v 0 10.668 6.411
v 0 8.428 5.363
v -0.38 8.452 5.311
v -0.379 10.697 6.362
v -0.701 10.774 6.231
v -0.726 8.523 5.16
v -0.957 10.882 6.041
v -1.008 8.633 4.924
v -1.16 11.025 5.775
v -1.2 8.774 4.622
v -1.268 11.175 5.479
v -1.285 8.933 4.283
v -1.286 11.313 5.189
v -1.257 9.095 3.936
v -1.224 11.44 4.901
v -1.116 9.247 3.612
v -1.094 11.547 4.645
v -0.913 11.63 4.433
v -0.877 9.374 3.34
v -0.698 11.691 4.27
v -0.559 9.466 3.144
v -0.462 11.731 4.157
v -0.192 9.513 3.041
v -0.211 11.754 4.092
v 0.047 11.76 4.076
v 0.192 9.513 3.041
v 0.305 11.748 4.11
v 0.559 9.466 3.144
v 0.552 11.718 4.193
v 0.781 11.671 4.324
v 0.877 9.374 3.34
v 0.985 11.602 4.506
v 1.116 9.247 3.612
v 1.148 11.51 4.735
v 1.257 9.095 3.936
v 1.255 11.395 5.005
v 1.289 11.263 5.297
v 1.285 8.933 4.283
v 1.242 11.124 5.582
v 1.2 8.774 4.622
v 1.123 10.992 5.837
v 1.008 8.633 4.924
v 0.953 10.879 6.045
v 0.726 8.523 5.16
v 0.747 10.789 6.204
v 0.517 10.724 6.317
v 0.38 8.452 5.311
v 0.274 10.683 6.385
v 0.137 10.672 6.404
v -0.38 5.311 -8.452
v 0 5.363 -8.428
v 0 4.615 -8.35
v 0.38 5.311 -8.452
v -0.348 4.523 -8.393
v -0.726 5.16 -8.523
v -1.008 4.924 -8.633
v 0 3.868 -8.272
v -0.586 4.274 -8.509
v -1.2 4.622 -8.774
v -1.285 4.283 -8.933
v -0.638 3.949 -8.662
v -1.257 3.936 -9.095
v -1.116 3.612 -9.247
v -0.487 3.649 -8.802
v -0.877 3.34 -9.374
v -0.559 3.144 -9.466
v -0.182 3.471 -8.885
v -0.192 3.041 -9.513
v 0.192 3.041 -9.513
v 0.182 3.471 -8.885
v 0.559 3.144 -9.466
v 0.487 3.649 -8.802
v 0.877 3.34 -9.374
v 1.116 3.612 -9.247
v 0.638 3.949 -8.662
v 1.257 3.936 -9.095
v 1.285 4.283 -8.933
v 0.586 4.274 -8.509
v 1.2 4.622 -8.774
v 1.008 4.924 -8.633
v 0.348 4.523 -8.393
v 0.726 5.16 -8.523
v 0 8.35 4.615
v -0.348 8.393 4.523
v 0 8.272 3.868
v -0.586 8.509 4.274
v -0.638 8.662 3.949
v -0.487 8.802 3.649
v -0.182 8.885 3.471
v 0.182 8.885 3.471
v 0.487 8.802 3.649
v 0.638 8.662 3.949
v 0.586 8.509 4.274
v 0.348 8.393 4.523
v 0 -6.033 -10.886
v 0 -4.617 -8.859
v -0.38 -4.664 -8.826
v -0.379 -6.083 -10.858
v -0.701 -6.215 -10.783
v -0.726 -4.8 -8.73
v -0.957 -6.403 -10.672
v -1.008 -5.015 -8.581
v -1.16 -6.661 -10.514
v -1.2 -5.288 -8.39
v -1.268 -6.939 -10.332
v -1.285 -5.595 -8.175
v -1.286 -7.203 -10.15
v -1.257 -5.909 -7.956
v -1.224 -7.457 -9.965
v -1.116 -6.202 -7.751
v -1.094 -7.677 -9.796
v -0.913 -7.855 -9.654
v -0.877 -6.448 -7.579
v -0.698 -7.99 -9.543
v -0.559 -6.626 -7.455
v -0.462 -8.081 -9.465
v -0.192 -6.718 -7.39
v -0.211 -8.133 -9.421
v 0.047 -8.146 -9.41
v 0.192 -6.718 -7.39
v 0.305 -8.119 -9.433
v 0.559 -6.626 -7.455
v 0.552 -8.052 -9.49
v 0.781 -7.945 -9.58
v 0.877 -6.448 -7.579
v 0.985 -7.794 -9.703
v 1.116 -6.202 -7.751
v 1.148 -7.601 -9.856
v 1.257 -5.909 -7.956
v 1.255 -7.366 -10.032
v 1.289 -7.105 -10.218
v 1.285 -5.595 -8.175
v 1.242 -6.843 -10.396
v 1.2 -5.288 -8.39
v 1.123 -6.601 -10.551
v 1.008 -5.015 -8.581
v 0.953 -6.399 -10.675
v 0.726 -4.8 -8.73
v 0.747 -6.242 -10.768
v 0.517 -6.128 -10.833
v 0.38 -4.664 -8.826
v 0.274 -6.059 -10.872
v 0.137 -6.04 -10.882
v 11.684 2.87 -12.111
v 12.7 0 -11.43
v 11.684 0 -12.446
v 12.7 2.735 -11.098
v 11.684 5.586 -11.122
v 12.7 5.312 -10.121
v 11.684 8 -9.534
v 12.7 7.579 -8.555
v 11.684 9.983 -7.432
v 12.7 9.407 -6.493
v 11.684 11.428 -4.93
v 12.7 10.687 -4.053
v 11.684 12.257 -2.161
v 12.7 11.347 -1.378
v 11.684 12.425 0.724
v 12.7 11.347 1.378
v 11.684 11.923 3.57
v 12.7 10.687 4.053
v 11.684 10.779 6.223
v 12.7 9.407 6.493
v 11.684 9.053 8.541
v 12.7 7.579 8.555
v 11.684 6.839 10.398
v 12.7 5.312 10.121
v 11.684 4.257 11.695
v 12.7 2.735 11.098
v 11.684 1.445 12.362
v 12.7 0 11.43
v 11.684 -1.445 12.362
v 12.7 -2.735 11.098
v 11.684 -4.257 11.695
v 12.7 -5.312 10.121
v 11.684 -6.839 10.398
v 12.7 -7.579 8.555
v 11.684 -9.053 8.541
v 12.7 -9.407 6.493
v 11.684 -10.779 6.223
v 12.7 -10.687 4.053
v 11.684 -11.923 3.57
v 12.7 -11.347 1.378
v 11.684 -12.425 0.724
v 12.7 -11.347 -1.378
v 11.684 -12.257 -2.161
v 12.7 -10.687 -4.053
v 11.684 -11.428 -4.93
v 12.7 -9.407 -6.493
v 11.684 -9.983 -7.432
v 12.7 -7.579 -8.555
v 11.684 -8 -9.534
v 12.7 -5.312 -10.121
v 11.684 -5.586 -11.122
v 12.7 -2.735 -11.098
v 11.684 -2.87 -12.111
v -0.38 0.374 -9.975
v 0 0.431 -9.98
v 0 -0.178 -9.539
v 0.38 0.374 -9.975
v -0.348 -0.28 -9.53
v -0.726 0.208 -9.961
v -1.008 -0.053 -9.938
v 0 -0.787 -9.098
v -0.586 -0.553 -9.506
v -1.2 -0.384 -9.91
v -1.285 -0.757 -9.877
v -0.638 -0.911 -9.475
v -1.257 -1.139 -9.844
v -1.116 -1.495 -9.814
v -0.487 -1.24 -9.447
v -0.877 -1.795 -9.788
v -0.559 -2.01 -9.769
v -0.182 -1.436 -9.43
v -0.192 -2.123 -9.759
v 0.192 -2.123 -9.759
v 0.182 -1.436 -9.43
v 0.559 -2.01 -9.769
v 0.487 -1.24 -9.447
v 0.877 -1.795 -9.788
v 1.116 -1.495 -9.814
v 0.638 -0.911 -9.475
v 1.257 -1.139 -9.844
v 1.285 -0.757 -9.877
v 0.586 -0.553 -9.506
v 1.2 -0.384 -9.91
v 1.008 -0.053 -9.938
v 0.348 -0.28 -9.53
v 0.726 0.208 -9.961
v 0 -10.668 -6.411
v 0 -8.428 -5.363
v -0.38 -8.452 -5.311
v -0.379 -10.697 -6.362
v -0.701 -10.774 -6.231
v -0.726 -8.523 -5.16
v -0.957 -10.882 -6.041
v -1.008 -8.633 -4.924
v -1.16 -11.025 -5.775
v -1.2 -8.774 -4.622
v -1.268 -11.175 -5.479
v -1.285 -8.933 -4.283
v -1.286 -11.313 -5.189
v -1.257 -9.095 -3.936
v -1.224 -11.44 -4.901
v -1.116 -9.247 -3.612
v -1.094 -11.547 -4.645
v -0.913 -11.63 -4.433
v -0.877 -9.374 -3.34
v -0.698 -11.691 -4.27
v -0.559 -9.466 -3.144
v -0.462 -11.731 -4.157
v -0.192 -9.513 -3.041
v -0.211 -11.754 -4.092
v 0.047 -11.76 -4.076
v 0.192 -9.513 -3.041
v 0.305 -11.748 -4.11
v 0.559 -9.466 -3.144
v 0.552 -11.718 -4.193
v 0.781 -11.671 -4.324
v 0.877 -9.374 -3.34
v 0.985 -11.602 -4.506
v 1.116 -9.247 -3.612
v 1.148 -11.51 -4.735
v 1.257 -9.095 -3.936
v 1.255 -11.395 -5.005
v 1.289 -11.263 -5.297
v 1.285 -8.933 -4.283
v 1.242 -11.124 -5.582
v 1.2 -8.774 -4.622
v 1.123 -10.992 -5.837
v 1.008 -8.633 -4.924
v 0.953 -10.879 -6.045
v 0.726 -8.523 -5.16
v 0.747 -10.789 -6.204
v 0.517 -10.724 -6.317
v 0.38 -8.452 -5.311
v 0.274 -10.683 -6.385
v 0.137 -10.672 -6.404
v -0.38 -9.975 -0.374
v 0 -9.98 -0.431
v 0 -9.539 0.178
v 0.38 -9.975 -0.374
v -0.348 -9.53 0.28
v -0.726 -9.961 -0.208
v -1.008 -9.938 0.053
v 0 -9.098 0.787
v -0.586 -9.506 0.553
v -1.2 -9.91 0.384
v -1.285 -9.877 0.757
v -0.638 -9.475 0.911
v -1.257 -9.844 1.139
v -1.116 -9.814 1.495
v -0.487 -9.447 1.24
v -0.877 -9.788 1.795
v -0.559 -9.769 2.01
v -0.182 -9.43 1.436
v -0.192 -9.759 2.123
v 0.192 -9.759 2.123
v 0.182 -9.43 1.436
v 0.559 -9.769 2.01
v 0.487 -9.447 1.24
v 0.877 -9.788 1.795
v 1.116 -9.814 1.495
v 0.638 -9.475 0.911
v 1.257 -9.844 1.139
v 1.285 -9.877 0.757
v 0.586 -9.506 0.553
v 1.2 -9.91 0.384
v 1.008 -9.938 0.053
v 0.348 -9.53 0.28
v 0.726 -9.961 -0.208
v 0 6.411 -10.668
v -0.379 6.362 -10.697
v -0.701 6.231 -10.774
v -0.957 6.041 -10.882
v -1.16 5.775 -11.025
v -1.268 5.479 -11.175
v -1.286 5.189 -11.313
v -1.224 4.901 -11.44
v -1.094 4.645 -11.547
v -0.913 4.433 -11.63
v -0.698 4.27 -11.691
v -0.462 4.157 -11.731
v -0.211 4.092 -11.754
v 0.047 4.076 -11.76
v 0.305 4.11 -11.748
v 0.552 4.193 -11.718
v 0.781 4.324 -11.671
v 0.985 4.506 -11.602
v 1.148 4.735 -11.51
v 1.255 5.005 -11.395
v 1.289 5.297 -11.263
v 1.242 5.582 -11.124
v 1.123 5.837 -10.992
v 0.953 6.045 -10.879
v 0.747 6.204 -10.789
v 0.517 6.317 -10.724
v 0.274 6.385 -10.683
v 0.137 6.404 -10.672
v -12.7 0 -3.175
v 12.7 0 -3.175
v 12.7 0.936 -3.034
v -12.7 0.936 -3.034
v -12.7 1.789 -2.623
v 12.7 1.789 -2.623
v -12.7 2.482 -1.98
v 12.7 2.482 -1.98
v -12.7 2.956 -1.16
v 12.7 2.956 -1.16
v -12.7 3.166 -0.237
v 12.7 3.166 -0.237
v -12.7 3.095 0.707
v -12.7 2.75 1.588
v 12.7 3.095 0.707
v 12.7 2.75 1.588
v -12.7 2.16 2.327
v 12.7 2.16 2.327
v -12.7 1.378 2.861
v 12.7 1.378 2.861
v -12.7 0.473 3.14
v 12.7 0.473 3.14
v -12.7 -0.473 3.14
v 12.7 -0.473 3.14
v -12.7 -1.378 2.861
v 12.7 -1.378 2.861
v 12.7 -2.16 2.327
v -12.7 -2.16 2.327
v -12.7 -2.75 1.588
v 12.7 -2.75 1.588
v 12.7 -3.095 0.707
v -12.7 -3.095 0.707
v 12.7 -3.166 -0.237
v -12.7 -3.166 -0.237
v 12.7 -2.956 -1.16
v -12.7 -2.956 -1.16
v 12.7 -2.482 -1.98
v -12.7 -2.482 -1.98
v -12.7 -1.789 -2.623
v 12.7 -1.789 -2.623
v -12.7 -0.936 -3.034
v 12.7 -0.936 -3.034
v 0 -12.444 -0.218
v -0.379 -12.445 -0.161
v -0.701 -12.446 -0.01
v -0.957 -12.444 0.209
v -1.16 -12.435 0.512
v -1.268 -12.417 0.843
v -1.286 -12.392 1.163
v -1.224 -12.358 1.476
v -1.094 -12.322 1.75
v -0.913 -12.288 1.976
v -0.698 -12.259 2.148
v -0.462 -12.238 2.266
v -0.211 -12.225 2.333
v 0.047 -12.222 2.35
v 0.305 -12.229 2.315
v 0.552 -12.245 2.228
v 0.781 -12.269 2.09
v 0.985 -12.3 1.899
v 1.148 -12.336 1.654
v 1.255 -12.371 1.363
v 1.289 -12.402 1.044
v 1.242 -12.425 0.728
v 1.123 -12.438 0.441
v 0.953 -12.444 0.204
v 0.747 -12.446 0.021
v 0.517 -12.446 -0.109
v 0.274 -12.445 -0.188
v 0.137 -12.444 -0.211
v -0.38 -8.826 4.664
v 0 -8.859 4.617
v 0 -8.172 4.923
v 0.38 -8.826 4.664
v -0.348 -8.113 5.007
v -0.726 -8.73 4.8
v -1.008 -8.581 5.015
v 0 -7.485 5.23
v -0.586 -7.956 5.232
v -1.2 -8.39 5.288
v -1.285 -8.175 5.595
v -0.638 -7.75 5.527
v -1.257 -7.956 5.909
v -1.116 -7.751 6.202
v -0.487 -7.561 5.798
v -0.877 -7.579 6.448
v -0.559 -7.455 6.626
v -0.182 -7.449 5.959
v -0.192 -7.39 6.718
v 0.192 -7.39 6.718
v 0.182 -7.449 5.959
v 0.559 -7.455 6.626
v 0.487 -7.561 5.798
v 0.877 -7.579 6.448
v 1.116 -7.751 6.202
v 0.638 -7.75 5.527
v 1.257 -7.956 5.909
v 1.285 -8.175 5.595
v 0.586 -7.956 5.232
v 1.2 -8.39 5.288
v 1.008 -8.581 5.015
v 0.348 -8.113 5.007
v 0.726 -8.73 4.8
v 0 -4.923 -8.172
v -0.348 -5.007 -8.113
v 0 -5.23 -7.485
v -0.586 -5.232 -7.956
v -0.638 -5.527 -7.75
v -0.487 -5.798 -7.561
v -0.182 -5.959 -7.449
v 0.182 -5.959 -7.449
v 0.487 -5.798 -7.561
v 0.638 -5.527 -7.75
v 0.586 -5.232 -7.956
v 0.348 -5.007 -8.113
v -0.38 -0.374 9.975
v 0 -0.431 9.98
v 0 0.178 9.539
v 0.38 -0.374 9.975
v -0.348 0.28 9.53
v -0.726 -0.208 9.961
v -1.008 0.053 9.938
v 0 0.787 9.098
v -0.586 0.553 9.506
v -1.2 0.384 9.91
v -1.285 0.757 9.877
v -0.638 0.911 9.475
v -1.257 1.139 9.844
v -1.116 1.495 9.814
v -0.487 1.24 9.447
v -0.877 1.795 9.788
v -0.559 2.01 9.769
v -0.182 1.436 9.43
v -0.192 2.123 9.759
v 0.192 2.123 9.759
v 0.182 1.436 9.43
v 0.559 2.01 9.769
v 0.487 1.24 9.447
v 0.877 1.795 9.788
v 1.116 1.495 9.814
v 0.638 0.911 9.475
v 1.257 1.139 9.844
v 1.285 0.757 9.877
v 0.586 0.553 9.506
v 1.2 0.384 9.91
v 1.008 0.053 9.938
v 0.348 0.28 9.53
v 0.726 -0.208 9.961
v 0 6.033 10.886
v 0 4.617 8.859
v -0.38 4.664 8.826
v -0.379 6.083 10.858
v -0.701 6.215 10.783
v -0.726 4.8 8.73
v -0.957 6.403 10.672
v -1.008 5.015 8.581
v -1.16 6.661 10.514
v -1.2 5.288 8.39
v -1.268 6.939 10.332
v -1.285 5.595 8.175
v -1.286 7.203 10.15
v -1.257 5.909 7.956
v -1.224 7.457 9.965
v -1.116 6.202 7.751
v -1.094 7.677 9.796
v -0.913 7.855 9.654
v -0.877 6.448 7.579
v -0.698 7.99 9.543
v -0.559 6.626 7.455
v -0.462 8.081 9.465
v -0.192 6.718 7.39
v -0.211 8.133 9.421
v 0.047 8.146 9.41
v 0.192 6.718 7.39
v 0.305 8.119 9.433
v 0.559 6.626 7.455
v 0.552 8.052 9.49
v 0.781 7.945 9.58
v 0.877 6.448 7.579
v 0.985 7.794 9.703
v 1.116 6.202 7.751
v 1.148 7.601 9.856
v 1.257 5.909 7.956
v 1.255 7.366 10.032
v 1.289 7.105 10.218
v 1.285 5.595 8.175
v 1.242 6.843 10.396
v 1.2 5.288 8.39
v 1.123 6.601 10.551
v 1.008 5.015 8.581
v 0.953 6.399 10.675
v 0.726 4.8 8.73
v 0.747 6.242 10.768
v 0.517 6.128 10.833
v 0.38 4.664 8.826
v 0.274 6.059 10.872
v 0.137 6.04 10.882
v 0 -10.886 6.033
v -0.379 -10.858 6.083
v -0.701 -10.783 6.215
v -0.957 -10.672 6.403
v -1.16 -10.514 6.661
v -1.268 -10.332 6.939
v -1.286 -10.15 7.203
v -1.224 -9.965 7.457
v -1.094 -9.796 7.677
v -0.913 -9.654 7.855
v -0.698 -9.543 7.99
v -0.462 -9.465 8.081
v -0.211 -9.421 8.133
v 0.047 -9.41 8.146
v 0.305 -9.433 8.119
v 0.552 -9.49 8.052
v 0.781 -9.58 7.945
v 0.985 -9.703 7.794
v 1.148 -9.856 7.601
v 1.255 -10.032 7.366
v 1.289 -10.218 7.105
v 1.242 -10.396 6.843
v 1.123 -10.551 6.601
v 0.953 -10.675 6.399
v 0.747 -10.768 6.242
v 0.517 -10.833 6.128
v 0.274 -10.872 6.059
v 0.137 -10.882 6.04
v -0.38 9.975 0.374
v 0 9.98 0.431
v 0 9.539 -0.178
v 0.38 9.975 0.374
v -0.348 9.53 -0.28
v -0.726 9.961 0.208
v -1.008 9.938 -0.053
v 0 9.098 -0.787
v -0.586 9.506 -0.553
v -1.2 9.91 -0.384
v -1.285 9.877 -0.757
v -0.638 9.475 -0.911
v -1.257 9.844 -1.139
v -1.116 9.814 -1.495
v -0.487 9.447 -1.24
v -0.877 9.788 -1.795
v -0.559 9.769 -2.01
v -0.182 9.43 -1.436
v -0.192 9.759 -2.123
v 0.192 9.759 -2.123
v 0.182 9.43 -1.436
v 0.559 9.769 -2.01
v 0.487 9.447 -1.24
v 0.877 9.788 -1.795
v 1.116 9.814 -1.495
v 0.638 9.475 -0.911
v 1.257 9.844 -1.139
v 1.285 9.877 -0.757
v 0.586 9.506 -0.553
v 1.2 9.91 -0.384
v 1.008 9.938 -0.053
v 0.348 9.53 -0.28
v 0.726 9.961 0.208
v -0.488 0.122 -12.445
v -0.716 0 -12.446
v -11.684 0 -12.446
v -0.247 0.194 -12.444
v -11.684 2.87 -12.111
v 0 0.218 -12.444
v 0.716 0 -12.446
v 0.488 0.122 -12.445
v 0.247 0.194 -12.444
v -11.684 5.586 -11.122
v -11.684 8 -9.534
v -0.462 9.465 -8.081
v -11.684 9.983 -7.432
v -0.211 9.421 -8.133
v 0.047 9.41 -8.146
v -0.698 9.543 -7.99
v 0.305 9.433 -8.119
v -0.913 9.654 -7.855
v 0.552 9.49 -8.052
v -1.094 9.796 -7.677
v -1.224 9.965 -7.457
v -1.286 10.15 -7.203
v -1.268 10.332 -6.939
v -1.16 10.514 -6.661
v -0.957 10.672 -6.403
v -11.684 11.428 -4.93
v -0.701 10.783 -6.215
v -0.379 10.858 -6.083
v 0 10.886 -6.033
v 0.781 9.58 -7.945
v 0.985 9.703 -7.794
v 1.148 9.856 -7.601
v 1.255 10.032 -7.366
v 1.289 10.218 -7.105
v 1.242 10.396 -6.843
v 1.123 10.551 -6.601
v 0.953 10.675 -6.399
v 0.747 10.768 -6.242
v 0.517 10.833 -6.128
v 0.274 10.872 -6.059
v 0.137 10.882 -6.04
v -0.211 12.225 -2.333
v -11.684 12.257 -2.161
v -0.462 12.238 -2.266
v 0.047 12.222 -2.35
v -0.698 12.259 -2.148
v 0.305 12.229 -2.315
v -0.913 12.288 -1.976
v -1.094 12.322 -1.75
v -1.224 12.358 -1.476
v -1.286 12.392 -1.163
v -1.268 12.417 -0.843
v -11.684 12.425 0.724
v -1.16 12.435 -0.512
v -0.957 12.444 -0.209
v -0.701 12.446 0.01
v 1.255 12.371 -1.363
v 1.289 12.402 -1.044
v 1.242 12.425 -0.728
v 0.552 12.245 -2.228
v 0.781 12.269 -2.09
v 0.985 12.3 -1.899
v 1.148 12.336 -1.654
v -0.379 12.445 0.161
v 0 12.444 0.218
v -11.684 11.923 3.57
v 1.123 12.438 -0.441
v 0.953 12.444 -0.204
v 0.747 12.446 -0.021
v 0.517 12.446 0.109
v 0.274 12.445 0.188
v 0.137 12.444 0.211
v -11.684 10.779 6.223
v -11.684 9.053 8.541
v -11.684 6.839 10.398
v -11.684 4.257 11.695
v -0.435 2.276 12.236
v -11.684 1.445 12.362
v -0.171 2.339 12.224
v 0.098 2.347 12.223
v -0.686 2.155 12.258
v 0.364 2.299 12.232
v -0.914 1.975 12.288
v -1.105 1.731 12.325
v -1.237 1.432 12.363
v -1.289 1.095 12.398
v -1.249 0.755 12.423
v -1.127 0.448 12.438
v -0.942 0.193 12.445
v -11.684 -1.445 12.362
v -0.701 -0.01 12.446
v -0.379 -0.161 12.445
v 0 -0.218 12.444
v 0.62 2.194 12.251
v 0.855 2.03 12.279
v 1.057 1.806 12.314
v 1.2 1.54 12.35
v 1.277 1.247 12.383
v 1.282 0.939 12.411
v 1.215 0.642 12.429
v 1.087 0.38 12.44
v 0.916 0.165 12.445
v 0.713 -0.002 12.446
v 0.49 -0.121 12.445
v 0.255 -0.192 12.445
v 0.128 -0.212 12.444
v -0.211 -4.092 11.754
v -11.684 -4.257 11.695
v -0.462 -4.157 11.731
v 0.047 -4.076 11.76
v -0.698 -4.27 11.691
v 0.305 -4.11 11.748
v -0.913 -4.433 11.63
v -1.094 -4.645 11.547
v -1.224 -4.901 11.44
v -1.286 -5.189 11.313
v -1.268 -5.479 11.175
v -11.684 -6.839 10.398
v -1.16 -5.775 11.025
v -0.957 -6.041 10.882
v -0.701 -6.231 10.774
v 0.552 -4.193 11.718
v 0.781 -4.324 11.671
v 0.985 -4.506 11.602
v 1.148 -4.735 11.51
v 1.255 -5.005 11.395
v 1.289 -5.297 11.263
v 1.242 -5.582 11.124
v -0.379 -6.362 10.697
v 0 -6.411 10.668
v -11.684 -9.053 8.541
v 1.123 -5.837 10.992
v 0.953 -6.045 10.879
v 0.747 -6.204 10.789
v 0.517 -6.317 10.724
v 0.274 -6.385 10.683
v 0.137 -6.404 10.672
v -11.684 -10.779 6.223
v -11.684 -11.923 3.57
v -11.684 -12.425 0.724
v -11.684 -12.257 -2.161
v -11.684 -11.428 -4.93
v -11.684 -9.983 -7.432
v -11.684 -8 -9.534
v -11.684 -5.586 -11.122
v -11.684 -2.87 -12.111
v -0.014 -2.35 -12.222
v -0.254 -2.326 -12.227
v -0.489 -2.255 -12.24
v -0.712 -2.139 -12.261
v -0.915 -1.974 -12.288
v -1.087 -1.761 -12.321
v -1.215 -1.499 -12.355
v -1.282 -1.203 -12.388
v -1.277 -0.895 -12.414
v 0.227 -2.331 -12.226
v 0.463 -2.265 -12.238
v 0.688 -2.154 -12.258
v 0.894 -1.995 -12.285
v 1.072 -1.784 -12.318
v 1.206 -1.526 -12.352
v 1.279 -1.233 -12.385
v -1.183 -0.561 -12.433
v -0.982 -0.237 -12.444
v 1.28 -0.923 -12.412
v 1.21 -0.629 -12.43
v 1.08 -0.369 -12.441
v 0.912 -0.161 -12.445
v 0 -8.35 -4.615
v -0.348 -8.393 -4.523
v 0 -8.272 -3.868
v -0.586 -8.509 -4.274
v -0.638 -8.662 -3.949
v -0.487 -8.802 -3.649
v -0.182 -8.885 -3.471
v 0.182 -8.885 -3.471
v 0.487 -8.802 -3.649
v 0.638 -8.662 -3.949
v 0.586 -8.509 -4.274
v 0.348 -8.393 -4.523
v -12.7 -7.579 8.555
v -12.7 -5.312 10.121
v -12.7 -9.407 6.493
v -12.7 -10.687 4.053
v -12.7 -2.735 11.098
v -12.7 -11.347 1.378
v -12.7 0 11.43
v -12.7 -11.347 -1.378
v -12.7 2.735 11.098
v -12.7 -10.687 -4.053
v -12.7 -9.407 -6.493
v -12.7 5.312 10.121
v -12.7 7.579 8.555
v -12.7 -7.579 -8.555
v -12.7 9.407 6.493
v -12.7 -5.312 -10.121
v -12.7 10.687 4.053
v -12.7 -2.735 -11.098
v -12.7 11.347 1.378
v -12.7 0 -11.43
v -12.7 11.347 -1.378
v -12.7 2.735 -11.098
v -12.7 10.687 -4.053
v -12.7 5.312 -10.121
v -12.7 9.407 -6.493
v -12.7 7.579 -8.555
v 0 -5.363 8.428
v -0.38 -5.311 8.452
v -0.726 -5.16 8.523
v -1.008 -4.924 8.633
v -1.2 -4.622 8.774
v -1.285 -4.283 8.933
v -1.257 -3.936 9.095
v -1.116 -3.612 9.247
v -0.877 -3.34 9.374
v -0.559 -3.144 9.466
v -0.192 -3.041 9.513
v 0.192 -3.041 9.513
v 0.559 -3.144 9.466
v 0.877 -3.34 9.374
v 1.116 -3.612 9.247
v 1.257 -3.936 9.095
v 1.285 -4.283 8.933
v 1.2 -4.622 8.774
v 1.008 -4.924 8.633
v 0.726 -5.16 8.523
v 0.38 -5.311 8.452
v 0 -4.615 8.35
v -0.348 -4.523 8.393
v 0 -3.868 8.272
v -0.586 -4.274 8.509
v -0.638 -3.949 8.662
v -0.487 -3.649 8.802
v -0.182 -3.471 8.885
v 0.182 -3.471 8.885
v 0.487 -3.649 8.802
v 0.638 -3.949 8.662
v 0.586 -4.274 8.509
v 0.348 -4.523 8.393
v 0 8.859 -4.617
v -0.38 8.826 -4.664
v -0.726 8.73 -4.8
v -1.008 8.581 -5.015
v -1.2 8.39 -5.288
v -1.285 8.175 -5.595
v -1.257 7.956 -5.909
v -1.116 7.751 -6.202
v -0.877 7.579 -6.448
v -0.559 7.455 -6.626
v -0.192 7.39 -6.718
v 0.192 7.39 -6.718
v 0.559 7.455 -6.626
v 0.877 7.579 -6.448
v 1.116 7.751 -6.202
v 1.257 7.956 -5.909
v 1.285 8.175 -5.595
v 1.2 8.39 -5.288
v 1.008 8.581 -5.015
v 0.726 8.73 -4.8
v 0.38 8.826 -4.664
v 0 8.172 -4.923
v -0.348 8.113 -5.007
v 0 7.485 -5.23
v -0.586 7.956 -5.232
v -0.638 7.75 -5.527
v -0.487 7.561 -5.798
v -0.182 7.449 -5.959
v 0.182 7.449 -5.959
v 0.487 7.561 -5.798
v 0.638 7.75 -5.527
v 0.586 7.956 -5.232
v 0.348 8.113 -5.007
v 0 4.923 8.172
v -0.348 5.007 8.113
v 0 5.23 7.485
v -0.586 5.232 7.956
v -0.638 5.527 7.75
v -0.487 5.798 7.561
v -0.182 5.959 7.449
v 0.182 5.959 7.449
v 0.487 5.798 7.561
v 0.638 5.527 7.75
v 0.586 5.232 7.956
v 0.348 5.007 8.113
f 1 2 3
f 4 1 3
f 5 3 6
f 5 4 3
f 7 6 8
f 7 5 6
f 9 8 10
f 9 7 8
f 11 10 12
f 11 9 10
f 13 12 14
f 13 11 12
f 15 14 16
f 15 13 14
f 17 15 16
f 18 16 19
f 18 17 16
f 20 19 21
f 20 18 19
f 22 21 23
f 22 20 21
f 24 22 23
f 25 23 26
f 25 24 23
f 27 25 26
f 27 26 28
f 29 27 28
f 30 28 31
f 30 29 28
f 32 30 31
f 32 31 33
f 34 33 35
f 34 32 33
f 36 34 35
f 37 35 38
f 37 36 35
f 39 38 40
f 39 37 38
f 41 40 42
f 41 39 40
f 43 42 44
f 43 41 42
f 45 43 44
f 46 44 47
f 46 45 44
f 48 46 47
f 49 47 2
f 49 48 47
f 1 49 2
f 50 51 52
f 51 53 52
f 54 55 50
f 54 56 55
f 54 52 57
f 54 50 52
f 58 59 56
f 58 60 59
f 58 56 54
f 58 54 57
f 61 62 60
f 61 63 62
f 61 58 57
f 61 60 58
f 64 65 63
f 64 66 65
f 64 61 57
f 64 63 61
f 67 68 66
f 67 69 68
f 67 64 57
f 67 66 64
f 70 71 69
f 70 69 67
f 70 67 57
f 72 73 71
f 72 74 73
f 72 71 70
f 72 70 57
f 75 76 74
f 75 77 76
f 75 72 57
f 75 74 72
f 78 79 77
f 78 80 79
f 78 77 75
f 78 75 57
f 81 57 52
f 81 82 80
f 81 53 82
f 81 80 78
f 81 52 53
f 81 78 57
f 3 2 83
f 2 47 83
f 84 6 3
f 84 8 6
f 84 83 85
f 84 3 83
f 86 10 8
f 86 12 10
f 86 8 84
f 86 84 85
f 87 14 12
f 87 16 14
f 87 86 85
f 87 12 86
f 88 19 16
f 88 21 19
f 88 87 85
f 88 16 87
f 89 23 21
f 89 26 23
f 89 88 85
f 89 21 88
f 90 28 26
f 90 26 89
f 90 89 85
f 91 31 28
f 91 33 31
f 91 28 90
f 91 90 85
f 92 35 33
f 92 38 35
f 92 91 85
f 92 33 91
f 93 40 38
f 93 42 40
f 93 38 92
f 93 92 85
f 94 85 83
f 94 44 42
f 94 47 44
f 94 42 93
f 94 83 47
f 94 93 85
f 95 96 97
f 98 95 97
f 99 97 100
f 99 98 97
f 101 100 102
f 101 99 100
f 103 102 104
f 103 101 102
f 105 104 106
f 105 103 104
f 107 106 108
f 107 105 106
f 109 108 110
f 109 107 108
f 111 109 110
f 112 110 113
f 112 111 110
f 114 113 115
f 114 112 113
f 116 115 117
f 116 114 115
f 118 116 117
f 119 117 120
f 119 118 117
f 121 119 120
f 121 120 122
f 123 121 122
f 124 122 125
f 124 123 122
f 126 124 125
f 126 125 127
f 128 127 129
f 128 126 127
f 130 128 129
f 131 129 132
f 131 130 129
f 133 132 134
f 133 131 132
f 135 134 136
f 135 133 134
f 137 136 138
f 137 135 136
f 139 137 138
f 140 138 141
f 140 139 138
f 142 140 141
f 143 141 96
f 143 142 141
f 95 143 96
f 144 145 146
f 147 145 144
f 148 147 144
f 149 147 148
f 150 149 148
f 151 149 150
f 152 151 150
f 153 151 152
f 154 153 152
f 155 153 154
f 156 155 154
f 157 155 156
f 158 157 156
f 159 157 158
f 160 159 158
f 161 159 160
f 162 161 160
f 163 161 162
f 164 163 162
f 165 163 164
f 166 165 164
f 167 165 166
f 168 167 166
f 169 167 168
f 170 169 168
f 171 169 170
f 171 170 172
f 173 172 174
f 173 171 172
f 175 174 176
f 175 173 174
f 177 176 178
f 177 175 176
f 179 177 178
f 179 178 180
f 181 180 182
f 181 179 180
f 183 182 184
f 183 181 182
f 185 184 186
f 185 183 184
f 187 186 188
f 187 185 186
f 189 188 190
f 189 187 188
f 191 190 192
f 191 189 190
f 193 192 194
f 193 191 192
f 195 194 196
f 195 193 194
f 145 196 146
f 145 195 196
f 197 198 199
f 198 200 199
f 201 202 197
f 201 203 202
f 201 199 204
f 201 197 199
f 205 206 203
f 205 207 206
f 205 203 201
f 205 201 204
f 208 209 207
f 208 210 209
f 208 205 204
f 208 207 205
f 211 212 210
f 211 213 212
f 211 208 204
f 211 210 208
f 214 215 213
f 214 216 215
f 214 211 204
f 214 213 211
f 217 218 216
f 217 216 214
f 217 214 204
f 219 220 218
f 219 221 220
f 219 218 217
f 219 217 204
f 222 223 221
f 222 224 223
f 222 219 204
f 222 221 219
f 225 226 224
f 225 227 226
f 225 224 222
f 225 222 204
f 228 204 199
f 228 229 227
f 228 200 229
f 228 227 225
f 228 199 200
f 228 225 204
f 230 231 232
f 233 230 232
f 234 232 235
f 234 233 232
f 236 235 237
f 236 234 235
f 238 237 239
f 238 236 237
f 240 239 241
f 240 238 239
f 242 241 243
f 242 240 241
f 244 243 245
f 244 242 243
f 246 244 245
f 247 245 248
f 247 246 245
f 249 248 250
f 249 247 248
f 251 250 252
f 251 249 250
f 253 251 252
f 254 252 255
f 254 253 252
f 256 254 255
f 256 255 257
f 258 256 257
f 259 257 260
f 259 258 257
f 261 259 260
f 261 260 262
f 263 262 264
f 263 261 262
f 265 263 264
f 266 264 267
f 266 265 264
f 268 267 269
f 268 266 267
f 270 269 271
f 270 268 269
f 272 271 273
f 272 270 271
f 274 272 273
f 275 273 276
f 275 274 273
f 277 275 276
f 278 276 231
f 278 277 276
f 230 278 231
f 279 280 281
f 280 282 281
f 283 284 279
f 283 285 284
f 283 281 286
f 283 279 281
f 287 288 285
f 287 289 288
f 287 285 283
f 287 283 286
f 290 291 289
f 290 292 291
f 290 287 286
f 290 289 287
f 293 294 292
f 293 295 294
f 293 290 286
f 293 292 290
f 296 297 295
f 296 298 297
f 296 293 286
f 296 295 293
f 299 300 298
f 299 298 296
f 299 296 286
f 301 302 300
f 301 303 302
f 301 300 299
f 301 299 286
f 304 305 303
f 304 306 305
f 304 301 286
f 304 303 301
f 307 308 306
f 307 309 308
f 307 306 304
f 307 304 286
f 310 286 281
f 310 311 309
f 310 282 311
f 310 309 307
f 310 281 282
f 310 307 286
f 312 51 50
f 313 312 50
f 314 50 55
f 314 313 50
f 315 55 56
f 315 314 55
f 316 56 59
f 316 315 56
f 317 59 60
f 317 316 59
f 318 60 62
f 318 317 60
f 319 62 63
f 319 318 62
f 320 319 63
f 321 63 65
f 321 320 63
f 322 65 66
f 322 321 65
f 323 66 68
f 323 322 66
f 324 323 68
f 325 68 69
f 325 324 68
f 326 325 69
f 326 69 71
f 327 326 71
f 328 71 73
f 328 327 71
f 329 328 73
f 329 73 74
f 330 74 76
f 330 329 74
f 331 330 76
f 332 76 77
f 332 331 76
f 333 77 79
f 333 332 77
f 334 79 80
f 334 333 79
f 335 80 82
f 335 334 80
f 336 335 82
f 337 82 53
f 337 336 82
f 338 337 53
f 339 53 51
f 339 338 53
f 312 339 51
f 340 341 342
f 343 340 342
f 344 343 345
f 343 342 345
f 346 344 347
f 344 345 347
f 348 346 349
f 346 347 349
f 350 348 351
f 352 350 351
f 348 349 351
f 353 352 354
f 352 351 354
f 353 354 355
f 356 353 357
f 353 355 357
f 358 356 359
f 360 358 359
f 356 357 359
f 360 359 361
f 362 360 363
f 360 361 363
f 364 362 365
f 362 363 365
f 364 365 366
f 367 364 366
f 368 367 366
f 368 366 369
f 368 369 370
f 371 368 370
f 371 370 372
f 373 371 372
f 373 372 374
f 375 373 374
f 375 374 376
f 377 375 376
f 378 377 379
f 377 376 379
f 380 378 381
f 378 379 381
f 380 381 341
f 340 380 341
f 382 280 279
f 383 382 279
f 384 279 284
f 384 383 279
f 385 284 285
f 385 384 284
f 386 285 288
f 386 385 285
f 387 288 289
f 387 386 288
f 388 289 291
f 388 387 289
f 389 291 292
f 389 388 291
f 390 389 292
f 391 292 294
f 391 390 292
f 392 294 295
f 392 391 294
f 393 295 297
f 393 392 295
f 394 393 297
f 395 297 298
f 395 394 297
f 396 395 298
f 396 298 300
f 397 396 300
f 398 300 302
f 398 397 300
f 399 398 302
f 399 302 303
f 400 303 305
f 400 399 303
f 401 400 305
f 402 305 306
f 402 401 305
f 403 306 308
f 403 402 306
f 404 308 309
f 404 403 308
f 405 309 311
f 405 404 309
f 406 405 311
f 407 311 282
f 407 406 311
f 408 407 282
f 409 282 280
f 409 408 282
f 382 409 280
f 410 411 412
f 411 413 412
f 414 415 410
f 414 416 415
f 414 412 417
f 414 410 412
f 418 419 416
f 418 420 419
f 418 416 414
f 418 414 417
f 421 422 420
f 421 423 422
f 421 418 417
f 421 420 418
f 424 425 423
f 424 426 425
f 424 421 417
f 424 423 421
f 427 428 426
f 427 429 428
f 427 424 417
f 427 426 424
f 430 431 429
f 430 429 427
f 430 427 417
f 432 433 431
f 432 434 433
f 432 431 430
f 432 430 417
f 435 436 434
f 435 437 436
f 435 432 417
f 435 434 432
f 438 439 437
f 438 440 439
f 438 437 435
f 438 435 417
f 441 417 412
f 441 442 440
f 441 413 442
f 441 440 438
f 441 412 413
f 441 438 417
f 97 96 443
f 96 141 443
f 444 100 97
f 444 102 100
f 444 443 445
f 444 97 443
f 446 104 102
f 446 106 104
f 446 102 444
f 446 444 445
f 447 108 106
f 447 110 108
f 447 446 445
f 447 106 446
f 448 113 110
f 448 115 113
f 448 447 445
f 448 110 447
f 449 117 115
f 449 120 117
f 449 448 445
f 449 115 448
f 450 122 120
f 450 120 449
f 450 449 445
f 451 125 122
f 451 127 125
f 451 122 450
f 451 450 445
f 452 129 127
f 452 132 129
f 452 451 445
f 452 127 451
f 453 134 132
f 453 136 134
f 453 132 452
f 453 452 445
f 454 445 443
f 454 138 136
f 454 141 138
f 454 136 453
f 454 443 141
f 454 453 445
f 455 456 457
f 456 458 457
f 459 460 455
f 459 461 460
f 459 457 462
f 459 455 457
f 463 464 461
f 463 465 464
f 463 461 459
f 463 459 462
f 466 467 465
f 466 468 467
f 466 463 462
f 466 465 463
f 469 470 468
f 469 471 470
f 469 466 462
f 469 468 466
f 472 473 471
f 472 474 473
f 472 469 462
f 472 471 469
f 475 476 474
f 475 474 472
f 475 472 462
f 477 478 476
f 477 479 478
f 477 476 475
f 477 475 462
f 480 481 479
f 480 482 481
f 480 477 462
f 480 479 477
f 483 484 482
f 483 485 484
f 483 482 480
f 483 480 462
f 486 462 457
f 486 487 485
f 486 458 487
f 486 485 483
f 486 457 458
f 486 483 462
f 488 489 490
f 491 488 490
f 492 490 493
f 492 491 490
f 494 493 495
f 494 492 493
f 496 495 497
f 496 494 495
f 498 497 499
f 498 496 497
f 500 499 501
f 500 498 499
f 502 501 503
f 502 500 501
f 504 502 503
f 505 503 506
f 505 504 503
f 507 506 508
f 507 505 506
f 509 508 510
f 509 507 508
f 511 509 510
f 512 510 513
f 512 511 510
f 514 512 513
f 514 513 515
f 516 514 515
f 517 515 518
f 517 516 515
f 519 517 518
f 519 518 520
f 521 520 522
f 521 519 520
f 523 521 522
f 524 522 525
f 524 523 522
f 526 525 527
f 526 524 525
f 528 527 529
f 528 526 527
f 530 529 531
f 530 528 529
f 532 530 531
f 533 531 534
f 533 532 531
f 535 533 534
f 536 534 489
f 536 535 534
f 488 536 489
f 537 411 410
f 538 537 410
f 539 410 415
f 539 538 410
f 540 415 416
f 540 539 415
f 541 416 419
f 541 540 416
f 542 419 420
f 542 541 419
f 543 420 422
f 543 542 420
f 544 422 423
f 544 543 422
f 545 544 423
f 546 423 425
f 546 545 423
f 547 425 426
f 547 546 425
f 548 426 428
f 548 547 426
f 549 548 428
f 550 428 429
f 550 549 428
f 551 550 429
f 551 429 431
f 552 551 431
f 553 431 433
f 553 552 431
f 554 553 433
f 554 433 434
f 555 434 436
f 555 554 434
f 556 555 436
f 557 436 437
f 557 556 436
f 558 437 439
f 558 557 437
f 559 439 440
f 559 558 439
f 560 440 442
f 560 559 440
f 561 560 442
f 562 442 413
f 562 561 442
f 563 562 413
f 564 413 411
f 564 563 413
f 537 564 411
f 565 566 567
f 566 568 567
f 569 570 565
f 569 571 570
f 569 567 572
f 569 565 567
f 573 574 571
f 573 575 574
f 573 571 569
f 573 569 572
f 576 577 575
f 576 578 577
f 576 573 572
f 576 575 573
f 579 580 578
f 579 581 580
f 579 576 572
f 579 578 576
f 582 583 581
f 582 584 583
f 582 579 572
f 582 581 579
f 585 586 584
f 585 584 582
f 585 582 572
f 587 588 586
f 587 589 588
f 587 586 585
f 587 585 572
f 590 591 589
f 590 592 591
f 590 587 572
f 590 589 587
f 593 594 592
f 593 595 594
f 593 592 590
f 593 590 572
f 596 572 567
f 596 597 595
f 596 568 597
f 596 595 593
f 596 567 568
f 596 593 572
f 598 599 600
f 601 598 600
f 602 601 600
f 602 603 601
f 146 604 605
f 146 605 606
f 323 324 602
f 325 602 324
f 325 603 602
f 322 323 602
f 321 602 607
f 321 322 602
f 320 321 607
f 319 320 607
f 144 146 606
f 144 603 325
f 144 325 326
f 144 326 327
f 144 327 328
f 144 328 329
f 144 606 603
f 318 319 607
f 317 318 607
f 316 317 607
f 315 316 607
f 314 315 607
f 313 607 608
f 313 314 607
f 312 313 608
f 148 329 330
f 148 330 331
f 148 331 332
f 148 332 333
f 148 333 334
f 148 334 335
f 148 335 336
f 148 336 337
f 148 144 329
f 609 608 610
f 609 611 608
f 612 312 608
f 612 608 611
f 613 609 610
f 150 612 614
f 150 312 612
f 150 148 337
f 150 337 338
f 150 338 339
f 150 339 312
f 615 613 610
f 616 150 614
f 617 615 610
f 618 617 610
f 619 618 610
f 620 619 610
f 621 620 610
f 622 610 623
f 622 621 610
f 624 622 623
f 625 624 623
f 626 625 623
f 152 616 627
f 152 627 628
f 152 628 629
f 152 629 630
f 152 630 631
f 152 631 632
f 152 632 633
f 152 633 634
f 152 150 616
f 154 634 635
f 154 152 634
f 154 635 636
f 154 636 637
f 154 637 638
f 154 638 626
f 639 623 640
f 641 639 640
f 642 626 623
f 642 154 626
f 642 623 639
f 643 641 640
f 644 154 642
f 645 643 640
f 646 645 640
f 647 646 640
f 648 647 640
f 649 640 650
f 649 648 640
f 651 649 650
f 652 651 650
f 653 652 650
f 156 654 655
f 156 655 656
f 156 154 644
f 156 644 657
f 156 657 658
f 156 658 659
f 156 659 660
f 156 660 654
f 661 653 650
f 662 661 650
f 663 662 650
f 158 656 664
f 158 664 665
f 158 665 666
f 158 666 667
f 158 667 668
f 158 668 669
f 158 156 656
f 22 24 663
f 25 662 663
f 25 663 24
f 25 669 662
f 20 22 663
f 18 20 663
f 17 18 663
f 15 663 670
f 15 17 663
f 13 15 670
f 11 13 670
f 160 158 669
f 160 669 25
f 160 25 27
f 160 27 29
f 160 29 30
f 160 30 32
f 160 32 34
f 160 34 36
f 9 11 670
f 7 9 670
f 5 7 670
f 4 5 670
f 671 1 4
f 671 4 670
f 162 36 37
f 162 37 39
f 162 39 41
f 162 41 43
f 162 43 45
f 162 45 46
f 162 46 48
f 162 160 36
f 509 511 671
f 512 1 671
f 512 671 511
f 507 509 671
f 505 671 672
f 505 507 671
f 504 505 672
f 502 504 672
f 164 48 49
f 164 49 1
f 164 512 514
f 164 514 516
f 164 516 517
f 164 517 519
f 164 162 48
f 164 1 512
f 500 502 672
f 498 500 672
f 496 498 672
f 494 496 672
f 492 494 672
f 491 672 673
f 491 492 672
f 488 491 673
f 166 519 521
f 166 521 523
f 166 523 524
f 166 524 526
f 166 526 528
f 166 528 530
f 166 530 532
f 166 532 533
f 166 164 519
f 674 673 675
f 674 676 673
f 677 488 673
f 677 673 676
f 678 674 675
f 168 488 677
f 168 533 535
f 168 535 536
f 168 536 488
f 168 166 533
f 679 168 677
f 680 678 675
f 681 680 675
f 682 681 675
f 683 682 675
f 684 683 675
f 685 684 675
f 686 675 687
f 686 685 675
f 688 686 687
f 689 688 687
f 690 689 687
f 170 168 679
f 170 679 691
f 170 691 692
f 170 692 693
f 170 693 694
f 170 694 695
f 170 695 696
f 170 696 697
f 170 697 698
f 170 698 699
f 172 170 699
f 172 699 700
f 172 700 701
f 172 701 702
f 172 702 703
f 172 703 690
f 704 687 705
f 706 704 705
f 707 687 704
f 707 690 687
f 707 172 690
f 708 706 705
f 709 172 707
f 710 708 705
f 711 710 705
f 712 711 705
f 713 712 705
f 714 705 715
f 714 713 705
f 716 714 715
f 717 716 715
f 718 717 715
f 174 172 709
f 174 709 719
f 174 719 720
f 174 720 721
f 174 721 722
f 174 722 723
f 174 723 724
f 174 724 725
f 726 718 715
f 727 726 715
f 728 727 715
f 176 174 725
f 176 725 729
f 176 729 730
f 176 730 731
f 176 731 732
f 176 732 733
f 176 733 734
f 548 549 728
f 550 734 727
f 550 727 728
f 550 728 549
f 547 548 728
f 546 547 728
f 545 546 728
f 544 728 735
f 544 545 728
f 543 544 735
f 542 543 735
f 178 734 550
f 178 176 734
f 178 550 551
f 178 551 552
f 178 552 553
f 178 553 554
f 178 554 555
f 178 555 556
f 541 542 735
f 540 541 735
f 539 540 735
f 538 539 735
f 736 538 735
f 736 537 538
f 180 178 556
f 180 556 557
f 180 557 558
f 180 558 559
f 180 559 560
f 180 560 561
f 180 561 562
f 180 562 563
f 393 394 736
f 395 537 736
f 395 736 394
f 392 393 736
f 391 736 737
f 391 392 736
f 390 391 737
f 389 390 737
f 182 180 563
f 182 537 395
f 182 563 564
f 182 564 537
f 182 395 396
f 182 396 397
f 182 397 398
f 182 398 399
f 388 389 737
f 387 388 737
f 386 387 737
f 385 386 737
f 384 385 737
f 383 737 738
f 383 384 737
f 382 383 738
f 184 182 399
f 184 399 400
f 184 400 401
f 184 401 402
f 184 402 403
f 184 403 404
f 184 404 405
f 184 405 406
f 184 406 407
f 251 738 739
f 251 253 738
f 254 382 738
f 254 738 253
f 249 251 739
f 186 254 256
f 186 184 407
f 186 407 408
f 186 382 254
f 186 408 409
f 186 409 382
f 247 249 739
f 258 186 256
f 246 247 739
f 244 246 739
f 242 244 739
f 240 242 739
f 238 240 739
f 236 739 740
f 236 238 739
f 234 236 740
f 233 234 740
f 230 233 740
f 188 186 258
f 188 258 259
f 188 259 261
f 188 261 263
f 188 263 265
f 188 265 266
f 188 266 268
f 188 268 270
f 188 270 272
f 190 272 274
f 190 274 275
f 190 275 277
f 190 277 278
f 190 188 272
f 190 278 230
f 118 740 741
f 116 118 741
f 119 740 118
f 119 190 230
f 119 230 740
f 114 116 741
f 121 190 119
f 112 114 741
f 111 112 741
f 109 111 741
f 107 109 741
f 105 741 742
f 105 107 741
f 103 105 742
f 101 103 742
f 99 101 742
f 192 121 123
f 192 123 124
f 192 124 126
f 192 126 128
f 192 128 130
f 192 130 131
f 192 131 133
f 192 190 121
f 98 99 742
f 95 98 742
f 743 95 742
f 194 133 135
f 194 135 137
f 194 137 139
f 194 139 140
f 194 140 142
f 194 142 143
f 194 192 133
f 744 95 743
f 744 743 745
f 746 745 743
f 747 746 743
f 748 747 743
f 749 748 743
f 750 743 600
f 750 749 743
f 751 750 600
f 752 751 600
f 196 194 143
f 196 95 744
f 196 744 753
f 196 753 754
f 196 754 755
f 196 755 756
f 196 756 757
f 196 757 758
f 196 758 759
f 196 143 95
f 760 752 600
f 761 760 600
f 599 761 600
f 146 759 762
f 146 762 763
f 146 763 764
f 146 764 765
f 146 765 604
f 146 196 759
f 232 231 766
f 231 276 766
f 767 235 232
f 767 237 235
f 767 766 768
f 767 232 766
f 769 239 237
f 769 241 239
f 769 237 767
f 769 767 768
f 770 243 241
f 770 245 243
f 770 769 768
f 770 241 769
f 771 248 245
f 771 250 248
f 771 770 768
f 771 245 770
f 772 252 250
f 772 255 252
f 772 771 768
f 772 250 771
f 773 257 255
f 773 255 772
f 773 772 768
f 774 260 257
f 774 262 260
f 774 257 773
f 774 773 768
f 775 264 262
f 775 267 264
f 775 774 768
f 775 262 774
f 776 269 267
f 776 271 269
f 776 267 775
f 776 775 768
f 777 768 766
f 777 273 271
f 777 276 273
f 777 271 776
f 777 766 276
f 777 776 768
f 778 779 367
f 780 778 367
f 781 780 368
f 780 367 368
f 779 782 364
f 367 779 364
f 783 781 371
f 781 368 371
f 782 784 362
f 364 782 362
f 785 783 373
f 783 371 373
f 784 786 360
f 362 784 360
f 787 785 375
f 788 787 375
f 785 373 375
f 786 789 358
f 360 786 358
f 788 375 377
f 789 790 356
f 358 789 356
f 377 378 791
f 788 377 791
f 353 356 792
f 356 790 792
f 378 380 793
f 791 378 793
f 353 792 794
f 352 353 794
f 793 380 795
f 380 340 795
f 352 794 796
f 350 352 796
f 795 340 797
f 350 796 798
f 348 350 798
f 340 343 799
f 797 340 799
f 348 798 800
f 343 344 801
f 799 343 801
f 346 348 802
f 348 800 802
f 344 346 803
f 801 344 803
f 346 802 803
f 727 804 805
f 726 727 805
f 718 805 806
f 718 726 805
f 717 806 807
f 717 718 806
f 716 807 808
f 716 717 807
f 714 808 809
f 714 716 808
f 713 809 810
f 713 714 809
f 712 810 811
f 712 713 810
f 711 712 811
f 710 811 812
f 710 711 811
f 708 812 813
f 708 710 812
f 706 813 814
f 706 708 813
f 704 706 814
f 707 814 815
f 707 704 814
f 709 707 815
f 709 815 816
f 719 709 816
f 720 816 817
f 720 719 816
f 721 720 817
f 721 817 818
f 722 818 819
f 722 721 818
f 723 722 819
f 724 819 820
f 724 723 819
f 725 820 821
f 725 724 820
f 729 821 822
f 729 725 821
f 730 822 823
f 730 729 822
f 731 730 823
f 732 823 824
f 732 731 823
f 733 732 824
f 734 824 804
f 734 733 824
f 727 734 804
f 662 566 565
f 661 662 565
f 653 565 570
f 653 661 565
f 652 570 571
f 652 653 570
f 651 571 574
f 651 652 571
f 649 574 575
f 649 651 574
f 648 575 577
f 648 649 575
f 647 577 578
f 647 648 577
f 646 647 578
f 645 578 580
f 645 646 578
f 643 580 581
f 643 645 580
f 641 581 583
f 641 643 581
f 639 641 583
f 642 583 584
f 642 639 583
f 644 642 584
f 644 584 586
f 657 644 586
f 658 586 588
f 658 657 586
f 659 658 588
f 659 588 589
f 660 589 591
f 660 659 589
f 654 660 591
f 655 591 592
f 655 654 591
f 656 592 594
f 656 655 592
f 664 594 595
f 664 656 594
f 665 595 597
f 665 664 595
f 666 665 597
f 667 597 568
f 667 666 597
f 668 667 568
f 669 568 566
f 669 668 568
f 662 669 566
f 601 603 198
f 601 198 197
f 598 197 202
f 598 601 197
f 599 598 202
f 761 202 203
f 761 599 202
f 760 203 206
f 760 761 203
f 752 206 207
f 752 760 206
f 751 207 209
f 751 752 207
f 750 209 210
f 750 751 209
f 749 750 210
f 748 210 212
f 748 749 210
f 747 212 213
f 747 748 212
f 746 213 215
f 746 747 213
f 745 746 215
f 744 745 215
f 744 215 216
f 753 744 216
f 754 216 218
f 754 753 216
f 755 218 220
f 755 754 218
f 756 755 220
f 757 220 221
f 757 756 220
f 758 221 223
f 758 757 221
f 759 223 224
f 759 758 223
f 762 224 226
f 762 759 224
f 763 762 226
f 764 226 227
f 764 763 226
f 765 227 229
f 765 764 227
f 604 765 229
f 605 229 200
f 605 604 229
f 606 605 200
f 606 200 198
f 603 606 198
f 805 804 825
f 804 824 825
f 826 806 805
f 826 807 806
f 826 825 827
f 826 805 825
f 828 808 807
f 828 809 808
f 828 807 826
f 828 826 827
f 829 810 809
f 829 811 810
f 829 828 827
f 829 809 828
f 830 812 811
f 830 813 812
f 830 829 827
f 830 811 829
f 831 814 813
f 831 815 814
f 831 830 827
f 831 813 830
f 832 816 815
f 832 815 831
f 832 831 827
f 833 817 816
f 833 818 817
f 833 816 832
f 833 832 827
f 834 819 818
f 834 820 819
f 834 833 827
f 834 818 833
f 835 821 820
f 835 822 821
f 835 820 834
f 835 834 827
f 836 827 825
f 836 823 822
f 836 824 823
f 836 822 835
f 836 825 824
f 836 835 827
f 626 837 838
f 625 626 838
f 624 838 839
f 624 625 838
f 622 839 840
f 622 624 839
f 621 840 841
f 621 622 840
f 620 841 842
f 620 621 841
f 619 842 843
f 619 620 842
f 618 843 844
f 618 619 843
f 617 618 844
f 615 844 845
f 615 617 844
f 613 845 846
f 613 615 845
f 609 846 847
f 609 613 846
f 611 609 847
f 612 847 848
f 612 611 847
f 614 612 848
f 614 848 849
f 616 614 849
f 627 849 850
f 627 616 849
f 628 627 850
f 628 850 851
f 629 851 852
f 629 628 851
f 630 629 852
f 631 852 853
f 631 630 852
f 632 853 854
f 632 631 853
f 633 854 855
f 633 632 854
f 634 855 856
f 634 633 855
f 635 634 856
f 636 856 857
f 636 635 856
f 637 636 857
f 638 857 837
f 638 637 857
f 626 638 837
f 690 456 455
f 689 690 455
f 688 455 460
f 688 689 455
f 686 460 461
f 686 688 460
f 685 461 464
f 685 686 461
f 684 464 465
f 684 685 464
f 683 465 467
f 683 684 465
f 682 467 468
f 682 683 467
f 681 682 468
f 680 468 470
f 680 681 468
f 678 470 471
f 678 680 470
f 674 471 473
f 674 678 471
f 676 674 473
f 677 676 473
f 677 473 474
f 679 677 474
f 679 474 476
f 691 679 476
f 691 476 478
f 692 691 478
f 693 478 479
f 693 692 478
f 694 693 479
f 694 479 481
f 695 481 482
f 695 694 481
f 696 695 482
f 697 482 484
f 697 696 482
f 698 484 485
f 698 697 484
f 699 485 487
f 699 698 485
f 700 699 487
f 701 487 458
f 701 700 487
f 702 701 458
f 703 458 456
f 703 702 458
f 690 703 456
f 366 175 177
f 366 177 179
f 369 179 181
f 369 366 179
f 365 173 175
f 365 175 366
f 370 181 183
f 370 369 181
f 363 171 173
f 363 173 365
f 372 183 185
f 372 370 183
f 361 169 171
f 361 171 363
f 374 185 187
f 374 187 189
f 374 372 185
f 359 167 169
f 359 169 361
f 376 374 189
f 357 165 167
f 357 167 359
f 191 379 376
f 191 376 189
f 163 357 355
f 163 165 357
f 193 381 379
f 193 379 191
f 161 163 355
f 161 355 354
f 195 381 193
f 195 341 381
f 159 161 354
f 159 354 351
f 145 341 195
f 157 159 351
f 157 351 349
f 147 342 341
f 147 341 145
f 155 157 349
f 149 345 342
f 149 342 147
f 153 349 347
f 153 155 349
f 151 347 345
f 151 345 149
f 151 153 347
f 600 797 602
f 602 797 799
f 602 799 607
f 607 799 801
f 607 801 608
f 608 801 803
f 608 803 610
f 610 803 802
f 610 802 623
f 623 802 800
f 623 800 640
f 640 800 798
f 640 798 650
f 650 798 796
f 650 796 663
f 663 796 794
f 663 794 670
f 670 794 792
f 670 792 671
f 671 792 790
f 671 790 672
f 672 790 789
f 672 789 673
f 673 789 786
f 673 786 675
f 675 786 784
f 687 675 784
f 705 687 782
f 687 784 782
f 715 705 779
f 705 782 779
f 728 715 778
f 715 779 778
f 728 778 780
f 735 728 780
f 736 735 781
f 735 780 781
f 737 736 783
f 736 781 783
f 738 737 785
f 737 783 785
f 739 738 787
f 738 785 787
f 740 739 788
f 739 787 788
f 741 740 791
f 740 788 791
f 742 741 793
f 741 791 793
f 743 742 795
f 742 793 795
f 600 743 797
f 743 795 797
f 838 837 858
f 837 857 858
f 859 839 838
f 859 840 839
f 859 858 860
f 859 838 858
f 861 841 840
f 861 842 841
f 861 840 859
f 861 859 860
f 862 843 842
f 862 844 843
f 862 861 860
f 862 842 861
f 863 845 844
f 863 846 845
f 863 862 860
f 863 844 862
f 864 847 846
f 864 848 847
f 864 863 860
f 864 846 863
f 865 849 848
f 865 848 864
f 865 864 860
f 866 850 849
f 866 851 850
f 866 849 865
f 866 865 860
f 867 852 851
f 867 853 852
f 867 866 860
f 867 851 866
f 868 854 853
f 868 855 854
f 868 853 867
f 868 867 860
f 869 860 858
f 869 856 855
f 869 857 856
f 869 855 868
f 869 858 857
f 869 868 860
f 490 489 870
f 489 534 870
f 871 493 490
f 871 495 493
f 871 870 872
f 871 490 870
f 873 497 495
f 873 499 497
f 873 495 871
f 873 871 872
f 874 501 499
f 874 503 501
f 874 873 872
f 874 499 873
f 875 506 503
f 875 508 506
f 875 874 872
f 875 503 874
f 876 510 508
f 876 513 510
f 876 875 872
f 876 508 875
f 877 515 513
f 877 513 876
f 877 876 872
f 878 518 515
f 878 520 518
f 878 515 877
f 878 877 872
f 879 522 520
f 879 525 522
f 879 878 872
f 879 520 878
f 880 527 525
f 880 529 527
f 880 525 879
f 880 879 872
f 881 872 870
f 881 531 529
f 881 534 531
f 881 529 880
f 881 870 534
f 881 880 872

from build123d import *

# Parameters (mm, degrees)
SKETCH1_R           = 12.446
BOSS_EXTRUDE1_DEPTH = 12.7
CHAMFER1_SIZE       = 1.016
CHAMFER2_SIZE       = 1.016
SKETCH2_R           = 3.175
CUT_EXTRUDE1_DEPTH  = 25.4
CIRPATTERN4_COUNT   = 12


with BuildPart() as part:
    # Sketch1 → Boss-Extrude1 (new body, symmetric)
    with BuildSketch(Plane(origin=(0, 0, 0), x_dir=(0, 0, -1), z_dir=(1, 0, 0))):
        Circle(SKETCH1_R)
    extrude(amount=BOSS_EXTRUDE1_DEPTH, both=True)

    # Chamfer1
    chamfer1_edges = [part.edges().sort_by_distance(p)[0] for p in [
        (12.7, 0, 12.446),
    ]]
    chamfer(chamfer1_edges, length=CHAMFER1_SIZE)

    # Chamfer2
    chamfer2_edges = [part.edges().sort_by_distance(p)[0] for p in [
        (-12.7, 0, 12.446),
    ]]
    chamfer(chamfer2_edges, length=CHAMFER2_SIZE)

    # Sketch2 → Cut-Extrude1 (cut)
    with BuildSketch(Plane(origin=(12.7, 0, 0), x_dir=(0, 0, -1), z_dir=(1, 0, 0))):
        Circle(SKETCH2_R)
    extrude(amount=-CUT_EXTRUDE1_DEPTH, mode=Mode.SUBTRACT)

    # Sketch4 → #38 (0.1015) Diameter Hole1 (revolve, cut)
    with BuildSketch(Plane(origin=(0, 10.202452378, -7.128315472), x_dir=(0, 0.572739472, 0.819737456), z_dir=(1, 0, 0))):
        Polygon((0, 0), (0, 3.314539381), (1.28905, 2.54), (1.28905, 0), align=None)
    f_38_0_1015_diameter_hole1 = revolve(axis=Axis((0, 15.407785224, -10.765211121), (0, -0.819737456, 0.572739472)), mode=Mode.SUBTRACT)

    # CirPattern4: #38 (0.1015) Diameter Hole1 ×12 about axis
    cirpattern4_axis = Axis((12.7, 0, 0), (-1, 0, 0))
    for i in range(1, CIRPATTERN4_COUNT):
        add(f_38_0_1015_diameter_hole1.rotate(cirpattern4_axis, i * 360 / CIRPATTERN4_COUNT), mode=Mode.SUBTRACT)


solid = part.part
